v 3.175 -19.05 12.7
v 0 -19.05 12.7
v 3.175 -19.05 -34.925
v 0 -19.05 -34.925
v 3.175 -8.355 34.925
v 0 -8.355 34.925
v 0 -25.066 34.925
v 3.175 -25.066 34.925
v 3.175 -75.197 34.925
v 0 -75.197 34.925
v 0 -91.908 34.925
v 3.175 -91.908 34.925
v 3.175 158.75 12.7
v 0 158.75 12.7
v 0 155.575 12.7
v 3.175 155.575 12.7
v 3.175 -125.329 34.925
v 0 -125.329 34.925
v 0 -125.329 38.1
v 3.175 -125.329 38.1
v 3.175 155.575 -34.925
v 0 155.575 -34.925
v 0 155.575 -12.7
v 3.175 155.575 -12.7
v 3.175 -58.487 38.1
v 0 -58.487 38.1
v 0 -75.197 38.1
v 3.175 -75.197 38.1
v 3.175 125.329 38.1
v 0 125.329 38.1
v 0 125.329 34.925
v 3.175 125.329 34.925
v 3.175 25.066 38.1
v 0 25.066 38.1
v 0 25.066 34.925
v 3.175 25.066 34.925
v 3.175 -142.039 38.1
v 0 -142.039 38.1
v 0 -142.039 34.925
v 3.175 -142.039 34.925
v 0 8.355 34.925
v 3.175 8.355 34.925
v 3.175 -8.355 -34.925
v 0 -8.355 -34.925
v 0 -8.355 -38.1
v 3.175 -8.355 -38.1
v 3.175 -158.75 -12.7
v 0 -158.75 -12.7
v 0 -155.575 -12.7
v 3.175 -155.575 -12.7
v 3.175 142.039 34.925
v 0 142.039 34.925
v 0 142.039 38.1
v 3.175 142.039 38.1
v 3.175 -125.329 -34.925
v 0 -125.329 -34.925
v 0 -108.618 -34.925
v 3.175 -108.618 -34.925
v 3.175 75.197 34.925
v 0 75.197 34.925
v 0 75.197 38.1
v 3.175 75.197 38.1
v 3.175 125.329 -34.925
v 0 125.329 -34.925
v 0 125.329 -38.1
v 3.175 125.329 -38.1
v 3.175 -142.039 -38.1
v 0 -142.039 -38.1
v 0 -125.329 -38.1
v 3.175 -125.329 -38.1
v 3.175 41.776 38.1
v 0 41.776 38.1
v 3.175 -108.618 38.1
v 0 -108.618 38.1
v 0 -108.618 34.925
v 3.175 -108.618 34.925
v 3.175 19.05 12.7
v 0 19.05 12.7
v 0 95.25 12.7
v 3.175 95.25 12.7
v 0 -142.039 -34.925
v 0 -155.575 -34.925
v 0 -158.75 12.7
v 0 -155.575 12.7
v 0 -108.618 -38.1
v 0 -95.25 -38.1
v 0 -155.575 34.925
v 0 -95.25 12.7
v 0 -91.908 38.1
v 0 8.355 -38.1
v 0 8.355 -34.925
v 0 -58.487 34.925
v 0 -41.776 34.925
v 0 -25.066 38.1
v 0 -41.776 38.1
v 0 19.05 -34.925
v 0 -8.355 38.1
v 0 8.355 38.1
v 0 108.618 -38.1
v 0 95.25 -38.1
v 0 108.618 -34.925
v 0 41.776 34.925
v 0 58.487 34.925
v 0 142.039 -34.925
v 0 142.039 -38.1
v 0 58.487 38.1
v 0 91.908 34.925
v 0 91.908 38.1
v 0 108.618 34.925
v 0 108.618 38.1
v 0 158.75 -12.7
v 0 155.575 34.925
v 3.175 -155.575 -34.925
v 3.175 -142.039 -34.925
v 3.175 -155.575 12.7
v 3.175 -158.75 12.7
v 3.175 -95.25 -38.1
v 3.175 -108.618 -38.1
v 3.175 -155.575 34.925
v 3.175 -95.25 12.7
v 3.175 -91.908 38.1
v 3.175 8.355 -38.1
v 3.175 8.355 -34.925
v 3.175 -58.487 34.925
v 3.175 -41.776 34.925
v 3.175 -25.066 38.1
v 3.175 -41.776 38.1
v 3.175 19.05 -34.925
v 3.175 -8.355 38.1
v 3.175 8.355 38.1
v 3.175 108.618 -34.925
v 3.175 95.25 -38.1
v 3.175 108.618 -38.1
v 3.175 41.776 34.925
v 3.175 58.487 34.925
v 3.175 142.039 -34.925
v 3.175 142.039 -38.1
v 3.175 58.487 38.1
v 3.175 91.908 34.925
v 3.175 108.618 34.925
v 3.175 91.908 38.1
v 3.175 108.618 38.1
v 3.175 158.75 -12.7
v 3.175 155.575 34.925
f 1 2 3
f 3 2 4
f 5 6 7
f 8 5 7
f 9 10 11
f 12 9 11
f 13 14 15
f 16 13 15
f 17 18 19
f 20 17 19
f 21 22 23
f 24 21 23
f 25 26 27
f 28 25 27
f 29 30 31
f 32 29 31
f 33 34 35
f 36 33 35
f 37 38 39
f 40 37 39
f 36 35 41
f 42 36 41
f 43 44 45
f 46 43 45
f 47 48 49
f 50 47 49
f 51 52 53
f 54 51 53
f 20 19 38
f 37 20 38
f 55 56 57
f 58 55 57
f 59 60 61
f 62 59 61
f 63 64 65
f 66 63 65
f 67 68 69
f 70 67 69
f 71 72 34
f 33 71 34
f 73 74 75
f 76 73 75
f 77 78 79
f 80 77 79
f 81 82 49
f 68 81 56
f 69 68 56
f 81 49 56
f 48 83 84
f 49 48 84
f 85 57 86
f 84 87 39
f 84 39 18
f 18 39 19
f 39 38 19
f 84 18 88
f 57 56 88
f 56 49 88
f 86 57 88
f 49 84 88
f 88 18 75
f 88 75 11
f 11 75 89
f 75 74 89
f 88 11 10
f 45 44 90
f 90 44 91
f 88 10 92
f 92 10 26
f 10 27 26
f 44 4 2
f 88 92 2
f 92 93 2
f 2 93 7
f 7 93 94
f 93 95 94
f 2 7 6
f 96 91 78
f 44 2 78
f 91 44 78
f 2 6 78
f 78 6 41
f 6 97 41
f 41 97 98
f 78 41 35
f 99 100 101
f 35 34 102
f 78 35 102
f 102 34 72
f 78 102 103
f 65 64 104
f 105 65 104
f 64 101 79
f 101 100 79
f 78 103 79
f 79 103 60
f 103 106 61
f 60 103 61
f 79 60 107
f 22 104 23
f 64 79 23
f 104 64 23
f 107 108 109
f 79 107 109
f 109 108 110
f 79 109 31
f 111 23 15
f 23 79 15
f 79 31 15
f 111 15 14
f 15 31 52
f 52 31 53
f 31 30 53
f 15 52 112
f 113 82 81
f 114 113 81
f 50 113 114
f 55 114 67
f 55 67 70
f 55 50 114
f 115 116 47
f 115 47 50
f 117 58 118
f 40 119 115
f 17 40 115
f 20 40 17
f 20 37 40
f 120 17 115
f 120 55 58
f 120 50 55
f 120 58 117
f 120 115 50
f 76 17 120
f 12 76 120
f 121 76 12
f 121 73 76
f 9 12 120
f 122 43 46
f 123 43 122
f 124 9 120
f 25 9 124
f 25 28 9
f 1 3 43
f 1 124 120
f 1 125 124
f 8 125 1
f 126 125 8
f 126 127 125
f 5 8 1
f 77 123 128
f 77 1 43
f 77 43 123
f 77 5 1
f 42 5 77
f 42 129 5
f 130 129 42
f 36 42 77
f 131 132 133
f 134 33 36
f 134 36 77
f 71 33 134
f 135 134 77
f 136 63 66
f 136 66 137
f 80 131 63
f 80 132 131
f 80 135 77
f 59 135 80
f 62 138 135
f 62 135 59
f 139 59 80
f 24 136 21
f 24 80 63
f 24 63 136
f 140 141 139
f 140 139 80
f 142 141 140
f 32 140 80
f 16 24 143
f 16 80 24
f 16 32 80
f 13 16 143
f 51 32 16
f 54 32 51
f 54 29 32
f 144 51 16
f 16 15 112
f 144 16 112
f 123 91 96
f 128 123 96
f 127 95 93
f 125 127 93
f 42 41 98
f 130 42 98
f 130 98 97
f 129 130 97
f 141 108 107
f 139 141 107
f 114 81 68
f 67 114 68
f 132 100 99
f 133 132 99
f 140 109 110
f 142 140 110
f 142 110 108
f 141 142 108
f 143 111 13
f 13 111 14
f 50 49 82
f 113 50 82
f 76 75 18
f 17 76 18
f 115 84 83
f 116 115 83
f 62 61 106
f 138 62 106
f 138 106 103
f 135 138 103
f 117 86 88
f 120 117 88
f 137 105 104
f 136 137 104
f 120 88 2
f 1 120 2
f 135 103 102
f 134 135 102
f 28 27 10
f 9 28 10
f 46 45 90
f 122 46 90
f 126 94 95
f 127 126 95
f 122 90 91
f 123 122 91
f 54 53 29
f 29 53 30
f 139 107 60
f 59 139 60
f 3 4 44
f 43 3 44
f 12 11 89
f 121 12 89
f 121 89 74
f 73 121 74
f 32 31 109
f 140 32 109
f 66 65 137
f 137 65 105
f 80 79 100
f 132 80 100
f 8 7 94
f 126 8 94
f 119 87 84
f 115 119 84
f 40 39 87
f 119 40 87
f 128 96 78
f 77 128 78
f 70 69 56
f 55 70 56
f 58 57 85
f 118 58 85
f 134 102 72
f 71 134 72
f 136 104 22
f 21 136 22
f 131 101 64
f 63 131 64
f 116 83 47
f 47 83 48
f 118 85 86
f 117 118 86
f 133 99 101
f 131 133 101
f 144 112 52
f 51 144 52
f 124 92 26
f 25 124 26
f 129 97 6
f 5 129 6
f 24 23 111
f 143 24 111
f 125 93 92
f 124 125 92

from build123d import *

# Parameters (mm, degrees)
F1_DEPTH = 3.175


with BuildPart() as f1:
    # F0 (on Right) → F1 (new body)
    with BuildSketch(Plane.YZ):
        Polygon((-155.575, 34.925), (-155.575, 12.7), (-158.75, 12.7), (-158.75, -12.7), (-155.575, -12.7), (-155.575, -34.925), (-142.039474, -34.925), (-142.039474, -38.1), (-125.328947, -38.1), (-125.328947, -34.925), (-108.618421, -34.925), (-108.618421, -38.1), (-95.25, -38.1), (-95.25, 12.7), (-19.05, 12.7), (-19.05, -34.925), (-8.355262, -34.925), (-8.355262, -38.1), (8.355264, -38.1), (8.355264, -34.925), (19.05, -34.925), (19.05, 12.7), (95.25, 12.7), (95.25, -38.1), (108.618422, -38.1), (108.618422, -34.925), (125.328949, -34.925), (125.328949, -38.1), (142.039475, -38.1), (142.039475, -34.925), (155.575, -34.925), (155.575, -12.7), (158.75, -12.7), (158.75, 12.7), (155.575, 12.7), (155.575, 34.925), (142.039475, 34.925), (142.039475, 38.1), (125.328949, 38.1), (125.328949, 34.925), (108.618422, 34.925), (108.618422, 38.1), (91.907896, 38.1), (91.907896, 34.925), (75.19737, 34.925), (75.19737, 38.1), (58.486843, 38.1), (58.486843, 34.925), (41.776317, 34.925), (41.776317, 38.1), (25.06579, 38.1), (25.06579, 34.925), (8.355264, 34.925), (8.355264, 38.1), (-8.355262, 38.1), (-8.355262, 34.925), (-25.065789, 34.925), (-25.065789, 38.1), (-41.776315, 38.1), (-41.776315, 34.925), (-58.486842, 34.925), (-58.486842, 38.1), (-75.197368, 38.1), (-75.197368, 34.925), (-91.907894, 34.925), (-91.907894, 38.1), (-108.618421, 38.1), (-108.618421, 34.925), (-125.328947, 34.925), (-125.328947, 38.1), (-142.039474, 38.1), (-142.039474, 34.925), align=None)
    extrude(amount=F1_DEPTH)


solid = f1.part
